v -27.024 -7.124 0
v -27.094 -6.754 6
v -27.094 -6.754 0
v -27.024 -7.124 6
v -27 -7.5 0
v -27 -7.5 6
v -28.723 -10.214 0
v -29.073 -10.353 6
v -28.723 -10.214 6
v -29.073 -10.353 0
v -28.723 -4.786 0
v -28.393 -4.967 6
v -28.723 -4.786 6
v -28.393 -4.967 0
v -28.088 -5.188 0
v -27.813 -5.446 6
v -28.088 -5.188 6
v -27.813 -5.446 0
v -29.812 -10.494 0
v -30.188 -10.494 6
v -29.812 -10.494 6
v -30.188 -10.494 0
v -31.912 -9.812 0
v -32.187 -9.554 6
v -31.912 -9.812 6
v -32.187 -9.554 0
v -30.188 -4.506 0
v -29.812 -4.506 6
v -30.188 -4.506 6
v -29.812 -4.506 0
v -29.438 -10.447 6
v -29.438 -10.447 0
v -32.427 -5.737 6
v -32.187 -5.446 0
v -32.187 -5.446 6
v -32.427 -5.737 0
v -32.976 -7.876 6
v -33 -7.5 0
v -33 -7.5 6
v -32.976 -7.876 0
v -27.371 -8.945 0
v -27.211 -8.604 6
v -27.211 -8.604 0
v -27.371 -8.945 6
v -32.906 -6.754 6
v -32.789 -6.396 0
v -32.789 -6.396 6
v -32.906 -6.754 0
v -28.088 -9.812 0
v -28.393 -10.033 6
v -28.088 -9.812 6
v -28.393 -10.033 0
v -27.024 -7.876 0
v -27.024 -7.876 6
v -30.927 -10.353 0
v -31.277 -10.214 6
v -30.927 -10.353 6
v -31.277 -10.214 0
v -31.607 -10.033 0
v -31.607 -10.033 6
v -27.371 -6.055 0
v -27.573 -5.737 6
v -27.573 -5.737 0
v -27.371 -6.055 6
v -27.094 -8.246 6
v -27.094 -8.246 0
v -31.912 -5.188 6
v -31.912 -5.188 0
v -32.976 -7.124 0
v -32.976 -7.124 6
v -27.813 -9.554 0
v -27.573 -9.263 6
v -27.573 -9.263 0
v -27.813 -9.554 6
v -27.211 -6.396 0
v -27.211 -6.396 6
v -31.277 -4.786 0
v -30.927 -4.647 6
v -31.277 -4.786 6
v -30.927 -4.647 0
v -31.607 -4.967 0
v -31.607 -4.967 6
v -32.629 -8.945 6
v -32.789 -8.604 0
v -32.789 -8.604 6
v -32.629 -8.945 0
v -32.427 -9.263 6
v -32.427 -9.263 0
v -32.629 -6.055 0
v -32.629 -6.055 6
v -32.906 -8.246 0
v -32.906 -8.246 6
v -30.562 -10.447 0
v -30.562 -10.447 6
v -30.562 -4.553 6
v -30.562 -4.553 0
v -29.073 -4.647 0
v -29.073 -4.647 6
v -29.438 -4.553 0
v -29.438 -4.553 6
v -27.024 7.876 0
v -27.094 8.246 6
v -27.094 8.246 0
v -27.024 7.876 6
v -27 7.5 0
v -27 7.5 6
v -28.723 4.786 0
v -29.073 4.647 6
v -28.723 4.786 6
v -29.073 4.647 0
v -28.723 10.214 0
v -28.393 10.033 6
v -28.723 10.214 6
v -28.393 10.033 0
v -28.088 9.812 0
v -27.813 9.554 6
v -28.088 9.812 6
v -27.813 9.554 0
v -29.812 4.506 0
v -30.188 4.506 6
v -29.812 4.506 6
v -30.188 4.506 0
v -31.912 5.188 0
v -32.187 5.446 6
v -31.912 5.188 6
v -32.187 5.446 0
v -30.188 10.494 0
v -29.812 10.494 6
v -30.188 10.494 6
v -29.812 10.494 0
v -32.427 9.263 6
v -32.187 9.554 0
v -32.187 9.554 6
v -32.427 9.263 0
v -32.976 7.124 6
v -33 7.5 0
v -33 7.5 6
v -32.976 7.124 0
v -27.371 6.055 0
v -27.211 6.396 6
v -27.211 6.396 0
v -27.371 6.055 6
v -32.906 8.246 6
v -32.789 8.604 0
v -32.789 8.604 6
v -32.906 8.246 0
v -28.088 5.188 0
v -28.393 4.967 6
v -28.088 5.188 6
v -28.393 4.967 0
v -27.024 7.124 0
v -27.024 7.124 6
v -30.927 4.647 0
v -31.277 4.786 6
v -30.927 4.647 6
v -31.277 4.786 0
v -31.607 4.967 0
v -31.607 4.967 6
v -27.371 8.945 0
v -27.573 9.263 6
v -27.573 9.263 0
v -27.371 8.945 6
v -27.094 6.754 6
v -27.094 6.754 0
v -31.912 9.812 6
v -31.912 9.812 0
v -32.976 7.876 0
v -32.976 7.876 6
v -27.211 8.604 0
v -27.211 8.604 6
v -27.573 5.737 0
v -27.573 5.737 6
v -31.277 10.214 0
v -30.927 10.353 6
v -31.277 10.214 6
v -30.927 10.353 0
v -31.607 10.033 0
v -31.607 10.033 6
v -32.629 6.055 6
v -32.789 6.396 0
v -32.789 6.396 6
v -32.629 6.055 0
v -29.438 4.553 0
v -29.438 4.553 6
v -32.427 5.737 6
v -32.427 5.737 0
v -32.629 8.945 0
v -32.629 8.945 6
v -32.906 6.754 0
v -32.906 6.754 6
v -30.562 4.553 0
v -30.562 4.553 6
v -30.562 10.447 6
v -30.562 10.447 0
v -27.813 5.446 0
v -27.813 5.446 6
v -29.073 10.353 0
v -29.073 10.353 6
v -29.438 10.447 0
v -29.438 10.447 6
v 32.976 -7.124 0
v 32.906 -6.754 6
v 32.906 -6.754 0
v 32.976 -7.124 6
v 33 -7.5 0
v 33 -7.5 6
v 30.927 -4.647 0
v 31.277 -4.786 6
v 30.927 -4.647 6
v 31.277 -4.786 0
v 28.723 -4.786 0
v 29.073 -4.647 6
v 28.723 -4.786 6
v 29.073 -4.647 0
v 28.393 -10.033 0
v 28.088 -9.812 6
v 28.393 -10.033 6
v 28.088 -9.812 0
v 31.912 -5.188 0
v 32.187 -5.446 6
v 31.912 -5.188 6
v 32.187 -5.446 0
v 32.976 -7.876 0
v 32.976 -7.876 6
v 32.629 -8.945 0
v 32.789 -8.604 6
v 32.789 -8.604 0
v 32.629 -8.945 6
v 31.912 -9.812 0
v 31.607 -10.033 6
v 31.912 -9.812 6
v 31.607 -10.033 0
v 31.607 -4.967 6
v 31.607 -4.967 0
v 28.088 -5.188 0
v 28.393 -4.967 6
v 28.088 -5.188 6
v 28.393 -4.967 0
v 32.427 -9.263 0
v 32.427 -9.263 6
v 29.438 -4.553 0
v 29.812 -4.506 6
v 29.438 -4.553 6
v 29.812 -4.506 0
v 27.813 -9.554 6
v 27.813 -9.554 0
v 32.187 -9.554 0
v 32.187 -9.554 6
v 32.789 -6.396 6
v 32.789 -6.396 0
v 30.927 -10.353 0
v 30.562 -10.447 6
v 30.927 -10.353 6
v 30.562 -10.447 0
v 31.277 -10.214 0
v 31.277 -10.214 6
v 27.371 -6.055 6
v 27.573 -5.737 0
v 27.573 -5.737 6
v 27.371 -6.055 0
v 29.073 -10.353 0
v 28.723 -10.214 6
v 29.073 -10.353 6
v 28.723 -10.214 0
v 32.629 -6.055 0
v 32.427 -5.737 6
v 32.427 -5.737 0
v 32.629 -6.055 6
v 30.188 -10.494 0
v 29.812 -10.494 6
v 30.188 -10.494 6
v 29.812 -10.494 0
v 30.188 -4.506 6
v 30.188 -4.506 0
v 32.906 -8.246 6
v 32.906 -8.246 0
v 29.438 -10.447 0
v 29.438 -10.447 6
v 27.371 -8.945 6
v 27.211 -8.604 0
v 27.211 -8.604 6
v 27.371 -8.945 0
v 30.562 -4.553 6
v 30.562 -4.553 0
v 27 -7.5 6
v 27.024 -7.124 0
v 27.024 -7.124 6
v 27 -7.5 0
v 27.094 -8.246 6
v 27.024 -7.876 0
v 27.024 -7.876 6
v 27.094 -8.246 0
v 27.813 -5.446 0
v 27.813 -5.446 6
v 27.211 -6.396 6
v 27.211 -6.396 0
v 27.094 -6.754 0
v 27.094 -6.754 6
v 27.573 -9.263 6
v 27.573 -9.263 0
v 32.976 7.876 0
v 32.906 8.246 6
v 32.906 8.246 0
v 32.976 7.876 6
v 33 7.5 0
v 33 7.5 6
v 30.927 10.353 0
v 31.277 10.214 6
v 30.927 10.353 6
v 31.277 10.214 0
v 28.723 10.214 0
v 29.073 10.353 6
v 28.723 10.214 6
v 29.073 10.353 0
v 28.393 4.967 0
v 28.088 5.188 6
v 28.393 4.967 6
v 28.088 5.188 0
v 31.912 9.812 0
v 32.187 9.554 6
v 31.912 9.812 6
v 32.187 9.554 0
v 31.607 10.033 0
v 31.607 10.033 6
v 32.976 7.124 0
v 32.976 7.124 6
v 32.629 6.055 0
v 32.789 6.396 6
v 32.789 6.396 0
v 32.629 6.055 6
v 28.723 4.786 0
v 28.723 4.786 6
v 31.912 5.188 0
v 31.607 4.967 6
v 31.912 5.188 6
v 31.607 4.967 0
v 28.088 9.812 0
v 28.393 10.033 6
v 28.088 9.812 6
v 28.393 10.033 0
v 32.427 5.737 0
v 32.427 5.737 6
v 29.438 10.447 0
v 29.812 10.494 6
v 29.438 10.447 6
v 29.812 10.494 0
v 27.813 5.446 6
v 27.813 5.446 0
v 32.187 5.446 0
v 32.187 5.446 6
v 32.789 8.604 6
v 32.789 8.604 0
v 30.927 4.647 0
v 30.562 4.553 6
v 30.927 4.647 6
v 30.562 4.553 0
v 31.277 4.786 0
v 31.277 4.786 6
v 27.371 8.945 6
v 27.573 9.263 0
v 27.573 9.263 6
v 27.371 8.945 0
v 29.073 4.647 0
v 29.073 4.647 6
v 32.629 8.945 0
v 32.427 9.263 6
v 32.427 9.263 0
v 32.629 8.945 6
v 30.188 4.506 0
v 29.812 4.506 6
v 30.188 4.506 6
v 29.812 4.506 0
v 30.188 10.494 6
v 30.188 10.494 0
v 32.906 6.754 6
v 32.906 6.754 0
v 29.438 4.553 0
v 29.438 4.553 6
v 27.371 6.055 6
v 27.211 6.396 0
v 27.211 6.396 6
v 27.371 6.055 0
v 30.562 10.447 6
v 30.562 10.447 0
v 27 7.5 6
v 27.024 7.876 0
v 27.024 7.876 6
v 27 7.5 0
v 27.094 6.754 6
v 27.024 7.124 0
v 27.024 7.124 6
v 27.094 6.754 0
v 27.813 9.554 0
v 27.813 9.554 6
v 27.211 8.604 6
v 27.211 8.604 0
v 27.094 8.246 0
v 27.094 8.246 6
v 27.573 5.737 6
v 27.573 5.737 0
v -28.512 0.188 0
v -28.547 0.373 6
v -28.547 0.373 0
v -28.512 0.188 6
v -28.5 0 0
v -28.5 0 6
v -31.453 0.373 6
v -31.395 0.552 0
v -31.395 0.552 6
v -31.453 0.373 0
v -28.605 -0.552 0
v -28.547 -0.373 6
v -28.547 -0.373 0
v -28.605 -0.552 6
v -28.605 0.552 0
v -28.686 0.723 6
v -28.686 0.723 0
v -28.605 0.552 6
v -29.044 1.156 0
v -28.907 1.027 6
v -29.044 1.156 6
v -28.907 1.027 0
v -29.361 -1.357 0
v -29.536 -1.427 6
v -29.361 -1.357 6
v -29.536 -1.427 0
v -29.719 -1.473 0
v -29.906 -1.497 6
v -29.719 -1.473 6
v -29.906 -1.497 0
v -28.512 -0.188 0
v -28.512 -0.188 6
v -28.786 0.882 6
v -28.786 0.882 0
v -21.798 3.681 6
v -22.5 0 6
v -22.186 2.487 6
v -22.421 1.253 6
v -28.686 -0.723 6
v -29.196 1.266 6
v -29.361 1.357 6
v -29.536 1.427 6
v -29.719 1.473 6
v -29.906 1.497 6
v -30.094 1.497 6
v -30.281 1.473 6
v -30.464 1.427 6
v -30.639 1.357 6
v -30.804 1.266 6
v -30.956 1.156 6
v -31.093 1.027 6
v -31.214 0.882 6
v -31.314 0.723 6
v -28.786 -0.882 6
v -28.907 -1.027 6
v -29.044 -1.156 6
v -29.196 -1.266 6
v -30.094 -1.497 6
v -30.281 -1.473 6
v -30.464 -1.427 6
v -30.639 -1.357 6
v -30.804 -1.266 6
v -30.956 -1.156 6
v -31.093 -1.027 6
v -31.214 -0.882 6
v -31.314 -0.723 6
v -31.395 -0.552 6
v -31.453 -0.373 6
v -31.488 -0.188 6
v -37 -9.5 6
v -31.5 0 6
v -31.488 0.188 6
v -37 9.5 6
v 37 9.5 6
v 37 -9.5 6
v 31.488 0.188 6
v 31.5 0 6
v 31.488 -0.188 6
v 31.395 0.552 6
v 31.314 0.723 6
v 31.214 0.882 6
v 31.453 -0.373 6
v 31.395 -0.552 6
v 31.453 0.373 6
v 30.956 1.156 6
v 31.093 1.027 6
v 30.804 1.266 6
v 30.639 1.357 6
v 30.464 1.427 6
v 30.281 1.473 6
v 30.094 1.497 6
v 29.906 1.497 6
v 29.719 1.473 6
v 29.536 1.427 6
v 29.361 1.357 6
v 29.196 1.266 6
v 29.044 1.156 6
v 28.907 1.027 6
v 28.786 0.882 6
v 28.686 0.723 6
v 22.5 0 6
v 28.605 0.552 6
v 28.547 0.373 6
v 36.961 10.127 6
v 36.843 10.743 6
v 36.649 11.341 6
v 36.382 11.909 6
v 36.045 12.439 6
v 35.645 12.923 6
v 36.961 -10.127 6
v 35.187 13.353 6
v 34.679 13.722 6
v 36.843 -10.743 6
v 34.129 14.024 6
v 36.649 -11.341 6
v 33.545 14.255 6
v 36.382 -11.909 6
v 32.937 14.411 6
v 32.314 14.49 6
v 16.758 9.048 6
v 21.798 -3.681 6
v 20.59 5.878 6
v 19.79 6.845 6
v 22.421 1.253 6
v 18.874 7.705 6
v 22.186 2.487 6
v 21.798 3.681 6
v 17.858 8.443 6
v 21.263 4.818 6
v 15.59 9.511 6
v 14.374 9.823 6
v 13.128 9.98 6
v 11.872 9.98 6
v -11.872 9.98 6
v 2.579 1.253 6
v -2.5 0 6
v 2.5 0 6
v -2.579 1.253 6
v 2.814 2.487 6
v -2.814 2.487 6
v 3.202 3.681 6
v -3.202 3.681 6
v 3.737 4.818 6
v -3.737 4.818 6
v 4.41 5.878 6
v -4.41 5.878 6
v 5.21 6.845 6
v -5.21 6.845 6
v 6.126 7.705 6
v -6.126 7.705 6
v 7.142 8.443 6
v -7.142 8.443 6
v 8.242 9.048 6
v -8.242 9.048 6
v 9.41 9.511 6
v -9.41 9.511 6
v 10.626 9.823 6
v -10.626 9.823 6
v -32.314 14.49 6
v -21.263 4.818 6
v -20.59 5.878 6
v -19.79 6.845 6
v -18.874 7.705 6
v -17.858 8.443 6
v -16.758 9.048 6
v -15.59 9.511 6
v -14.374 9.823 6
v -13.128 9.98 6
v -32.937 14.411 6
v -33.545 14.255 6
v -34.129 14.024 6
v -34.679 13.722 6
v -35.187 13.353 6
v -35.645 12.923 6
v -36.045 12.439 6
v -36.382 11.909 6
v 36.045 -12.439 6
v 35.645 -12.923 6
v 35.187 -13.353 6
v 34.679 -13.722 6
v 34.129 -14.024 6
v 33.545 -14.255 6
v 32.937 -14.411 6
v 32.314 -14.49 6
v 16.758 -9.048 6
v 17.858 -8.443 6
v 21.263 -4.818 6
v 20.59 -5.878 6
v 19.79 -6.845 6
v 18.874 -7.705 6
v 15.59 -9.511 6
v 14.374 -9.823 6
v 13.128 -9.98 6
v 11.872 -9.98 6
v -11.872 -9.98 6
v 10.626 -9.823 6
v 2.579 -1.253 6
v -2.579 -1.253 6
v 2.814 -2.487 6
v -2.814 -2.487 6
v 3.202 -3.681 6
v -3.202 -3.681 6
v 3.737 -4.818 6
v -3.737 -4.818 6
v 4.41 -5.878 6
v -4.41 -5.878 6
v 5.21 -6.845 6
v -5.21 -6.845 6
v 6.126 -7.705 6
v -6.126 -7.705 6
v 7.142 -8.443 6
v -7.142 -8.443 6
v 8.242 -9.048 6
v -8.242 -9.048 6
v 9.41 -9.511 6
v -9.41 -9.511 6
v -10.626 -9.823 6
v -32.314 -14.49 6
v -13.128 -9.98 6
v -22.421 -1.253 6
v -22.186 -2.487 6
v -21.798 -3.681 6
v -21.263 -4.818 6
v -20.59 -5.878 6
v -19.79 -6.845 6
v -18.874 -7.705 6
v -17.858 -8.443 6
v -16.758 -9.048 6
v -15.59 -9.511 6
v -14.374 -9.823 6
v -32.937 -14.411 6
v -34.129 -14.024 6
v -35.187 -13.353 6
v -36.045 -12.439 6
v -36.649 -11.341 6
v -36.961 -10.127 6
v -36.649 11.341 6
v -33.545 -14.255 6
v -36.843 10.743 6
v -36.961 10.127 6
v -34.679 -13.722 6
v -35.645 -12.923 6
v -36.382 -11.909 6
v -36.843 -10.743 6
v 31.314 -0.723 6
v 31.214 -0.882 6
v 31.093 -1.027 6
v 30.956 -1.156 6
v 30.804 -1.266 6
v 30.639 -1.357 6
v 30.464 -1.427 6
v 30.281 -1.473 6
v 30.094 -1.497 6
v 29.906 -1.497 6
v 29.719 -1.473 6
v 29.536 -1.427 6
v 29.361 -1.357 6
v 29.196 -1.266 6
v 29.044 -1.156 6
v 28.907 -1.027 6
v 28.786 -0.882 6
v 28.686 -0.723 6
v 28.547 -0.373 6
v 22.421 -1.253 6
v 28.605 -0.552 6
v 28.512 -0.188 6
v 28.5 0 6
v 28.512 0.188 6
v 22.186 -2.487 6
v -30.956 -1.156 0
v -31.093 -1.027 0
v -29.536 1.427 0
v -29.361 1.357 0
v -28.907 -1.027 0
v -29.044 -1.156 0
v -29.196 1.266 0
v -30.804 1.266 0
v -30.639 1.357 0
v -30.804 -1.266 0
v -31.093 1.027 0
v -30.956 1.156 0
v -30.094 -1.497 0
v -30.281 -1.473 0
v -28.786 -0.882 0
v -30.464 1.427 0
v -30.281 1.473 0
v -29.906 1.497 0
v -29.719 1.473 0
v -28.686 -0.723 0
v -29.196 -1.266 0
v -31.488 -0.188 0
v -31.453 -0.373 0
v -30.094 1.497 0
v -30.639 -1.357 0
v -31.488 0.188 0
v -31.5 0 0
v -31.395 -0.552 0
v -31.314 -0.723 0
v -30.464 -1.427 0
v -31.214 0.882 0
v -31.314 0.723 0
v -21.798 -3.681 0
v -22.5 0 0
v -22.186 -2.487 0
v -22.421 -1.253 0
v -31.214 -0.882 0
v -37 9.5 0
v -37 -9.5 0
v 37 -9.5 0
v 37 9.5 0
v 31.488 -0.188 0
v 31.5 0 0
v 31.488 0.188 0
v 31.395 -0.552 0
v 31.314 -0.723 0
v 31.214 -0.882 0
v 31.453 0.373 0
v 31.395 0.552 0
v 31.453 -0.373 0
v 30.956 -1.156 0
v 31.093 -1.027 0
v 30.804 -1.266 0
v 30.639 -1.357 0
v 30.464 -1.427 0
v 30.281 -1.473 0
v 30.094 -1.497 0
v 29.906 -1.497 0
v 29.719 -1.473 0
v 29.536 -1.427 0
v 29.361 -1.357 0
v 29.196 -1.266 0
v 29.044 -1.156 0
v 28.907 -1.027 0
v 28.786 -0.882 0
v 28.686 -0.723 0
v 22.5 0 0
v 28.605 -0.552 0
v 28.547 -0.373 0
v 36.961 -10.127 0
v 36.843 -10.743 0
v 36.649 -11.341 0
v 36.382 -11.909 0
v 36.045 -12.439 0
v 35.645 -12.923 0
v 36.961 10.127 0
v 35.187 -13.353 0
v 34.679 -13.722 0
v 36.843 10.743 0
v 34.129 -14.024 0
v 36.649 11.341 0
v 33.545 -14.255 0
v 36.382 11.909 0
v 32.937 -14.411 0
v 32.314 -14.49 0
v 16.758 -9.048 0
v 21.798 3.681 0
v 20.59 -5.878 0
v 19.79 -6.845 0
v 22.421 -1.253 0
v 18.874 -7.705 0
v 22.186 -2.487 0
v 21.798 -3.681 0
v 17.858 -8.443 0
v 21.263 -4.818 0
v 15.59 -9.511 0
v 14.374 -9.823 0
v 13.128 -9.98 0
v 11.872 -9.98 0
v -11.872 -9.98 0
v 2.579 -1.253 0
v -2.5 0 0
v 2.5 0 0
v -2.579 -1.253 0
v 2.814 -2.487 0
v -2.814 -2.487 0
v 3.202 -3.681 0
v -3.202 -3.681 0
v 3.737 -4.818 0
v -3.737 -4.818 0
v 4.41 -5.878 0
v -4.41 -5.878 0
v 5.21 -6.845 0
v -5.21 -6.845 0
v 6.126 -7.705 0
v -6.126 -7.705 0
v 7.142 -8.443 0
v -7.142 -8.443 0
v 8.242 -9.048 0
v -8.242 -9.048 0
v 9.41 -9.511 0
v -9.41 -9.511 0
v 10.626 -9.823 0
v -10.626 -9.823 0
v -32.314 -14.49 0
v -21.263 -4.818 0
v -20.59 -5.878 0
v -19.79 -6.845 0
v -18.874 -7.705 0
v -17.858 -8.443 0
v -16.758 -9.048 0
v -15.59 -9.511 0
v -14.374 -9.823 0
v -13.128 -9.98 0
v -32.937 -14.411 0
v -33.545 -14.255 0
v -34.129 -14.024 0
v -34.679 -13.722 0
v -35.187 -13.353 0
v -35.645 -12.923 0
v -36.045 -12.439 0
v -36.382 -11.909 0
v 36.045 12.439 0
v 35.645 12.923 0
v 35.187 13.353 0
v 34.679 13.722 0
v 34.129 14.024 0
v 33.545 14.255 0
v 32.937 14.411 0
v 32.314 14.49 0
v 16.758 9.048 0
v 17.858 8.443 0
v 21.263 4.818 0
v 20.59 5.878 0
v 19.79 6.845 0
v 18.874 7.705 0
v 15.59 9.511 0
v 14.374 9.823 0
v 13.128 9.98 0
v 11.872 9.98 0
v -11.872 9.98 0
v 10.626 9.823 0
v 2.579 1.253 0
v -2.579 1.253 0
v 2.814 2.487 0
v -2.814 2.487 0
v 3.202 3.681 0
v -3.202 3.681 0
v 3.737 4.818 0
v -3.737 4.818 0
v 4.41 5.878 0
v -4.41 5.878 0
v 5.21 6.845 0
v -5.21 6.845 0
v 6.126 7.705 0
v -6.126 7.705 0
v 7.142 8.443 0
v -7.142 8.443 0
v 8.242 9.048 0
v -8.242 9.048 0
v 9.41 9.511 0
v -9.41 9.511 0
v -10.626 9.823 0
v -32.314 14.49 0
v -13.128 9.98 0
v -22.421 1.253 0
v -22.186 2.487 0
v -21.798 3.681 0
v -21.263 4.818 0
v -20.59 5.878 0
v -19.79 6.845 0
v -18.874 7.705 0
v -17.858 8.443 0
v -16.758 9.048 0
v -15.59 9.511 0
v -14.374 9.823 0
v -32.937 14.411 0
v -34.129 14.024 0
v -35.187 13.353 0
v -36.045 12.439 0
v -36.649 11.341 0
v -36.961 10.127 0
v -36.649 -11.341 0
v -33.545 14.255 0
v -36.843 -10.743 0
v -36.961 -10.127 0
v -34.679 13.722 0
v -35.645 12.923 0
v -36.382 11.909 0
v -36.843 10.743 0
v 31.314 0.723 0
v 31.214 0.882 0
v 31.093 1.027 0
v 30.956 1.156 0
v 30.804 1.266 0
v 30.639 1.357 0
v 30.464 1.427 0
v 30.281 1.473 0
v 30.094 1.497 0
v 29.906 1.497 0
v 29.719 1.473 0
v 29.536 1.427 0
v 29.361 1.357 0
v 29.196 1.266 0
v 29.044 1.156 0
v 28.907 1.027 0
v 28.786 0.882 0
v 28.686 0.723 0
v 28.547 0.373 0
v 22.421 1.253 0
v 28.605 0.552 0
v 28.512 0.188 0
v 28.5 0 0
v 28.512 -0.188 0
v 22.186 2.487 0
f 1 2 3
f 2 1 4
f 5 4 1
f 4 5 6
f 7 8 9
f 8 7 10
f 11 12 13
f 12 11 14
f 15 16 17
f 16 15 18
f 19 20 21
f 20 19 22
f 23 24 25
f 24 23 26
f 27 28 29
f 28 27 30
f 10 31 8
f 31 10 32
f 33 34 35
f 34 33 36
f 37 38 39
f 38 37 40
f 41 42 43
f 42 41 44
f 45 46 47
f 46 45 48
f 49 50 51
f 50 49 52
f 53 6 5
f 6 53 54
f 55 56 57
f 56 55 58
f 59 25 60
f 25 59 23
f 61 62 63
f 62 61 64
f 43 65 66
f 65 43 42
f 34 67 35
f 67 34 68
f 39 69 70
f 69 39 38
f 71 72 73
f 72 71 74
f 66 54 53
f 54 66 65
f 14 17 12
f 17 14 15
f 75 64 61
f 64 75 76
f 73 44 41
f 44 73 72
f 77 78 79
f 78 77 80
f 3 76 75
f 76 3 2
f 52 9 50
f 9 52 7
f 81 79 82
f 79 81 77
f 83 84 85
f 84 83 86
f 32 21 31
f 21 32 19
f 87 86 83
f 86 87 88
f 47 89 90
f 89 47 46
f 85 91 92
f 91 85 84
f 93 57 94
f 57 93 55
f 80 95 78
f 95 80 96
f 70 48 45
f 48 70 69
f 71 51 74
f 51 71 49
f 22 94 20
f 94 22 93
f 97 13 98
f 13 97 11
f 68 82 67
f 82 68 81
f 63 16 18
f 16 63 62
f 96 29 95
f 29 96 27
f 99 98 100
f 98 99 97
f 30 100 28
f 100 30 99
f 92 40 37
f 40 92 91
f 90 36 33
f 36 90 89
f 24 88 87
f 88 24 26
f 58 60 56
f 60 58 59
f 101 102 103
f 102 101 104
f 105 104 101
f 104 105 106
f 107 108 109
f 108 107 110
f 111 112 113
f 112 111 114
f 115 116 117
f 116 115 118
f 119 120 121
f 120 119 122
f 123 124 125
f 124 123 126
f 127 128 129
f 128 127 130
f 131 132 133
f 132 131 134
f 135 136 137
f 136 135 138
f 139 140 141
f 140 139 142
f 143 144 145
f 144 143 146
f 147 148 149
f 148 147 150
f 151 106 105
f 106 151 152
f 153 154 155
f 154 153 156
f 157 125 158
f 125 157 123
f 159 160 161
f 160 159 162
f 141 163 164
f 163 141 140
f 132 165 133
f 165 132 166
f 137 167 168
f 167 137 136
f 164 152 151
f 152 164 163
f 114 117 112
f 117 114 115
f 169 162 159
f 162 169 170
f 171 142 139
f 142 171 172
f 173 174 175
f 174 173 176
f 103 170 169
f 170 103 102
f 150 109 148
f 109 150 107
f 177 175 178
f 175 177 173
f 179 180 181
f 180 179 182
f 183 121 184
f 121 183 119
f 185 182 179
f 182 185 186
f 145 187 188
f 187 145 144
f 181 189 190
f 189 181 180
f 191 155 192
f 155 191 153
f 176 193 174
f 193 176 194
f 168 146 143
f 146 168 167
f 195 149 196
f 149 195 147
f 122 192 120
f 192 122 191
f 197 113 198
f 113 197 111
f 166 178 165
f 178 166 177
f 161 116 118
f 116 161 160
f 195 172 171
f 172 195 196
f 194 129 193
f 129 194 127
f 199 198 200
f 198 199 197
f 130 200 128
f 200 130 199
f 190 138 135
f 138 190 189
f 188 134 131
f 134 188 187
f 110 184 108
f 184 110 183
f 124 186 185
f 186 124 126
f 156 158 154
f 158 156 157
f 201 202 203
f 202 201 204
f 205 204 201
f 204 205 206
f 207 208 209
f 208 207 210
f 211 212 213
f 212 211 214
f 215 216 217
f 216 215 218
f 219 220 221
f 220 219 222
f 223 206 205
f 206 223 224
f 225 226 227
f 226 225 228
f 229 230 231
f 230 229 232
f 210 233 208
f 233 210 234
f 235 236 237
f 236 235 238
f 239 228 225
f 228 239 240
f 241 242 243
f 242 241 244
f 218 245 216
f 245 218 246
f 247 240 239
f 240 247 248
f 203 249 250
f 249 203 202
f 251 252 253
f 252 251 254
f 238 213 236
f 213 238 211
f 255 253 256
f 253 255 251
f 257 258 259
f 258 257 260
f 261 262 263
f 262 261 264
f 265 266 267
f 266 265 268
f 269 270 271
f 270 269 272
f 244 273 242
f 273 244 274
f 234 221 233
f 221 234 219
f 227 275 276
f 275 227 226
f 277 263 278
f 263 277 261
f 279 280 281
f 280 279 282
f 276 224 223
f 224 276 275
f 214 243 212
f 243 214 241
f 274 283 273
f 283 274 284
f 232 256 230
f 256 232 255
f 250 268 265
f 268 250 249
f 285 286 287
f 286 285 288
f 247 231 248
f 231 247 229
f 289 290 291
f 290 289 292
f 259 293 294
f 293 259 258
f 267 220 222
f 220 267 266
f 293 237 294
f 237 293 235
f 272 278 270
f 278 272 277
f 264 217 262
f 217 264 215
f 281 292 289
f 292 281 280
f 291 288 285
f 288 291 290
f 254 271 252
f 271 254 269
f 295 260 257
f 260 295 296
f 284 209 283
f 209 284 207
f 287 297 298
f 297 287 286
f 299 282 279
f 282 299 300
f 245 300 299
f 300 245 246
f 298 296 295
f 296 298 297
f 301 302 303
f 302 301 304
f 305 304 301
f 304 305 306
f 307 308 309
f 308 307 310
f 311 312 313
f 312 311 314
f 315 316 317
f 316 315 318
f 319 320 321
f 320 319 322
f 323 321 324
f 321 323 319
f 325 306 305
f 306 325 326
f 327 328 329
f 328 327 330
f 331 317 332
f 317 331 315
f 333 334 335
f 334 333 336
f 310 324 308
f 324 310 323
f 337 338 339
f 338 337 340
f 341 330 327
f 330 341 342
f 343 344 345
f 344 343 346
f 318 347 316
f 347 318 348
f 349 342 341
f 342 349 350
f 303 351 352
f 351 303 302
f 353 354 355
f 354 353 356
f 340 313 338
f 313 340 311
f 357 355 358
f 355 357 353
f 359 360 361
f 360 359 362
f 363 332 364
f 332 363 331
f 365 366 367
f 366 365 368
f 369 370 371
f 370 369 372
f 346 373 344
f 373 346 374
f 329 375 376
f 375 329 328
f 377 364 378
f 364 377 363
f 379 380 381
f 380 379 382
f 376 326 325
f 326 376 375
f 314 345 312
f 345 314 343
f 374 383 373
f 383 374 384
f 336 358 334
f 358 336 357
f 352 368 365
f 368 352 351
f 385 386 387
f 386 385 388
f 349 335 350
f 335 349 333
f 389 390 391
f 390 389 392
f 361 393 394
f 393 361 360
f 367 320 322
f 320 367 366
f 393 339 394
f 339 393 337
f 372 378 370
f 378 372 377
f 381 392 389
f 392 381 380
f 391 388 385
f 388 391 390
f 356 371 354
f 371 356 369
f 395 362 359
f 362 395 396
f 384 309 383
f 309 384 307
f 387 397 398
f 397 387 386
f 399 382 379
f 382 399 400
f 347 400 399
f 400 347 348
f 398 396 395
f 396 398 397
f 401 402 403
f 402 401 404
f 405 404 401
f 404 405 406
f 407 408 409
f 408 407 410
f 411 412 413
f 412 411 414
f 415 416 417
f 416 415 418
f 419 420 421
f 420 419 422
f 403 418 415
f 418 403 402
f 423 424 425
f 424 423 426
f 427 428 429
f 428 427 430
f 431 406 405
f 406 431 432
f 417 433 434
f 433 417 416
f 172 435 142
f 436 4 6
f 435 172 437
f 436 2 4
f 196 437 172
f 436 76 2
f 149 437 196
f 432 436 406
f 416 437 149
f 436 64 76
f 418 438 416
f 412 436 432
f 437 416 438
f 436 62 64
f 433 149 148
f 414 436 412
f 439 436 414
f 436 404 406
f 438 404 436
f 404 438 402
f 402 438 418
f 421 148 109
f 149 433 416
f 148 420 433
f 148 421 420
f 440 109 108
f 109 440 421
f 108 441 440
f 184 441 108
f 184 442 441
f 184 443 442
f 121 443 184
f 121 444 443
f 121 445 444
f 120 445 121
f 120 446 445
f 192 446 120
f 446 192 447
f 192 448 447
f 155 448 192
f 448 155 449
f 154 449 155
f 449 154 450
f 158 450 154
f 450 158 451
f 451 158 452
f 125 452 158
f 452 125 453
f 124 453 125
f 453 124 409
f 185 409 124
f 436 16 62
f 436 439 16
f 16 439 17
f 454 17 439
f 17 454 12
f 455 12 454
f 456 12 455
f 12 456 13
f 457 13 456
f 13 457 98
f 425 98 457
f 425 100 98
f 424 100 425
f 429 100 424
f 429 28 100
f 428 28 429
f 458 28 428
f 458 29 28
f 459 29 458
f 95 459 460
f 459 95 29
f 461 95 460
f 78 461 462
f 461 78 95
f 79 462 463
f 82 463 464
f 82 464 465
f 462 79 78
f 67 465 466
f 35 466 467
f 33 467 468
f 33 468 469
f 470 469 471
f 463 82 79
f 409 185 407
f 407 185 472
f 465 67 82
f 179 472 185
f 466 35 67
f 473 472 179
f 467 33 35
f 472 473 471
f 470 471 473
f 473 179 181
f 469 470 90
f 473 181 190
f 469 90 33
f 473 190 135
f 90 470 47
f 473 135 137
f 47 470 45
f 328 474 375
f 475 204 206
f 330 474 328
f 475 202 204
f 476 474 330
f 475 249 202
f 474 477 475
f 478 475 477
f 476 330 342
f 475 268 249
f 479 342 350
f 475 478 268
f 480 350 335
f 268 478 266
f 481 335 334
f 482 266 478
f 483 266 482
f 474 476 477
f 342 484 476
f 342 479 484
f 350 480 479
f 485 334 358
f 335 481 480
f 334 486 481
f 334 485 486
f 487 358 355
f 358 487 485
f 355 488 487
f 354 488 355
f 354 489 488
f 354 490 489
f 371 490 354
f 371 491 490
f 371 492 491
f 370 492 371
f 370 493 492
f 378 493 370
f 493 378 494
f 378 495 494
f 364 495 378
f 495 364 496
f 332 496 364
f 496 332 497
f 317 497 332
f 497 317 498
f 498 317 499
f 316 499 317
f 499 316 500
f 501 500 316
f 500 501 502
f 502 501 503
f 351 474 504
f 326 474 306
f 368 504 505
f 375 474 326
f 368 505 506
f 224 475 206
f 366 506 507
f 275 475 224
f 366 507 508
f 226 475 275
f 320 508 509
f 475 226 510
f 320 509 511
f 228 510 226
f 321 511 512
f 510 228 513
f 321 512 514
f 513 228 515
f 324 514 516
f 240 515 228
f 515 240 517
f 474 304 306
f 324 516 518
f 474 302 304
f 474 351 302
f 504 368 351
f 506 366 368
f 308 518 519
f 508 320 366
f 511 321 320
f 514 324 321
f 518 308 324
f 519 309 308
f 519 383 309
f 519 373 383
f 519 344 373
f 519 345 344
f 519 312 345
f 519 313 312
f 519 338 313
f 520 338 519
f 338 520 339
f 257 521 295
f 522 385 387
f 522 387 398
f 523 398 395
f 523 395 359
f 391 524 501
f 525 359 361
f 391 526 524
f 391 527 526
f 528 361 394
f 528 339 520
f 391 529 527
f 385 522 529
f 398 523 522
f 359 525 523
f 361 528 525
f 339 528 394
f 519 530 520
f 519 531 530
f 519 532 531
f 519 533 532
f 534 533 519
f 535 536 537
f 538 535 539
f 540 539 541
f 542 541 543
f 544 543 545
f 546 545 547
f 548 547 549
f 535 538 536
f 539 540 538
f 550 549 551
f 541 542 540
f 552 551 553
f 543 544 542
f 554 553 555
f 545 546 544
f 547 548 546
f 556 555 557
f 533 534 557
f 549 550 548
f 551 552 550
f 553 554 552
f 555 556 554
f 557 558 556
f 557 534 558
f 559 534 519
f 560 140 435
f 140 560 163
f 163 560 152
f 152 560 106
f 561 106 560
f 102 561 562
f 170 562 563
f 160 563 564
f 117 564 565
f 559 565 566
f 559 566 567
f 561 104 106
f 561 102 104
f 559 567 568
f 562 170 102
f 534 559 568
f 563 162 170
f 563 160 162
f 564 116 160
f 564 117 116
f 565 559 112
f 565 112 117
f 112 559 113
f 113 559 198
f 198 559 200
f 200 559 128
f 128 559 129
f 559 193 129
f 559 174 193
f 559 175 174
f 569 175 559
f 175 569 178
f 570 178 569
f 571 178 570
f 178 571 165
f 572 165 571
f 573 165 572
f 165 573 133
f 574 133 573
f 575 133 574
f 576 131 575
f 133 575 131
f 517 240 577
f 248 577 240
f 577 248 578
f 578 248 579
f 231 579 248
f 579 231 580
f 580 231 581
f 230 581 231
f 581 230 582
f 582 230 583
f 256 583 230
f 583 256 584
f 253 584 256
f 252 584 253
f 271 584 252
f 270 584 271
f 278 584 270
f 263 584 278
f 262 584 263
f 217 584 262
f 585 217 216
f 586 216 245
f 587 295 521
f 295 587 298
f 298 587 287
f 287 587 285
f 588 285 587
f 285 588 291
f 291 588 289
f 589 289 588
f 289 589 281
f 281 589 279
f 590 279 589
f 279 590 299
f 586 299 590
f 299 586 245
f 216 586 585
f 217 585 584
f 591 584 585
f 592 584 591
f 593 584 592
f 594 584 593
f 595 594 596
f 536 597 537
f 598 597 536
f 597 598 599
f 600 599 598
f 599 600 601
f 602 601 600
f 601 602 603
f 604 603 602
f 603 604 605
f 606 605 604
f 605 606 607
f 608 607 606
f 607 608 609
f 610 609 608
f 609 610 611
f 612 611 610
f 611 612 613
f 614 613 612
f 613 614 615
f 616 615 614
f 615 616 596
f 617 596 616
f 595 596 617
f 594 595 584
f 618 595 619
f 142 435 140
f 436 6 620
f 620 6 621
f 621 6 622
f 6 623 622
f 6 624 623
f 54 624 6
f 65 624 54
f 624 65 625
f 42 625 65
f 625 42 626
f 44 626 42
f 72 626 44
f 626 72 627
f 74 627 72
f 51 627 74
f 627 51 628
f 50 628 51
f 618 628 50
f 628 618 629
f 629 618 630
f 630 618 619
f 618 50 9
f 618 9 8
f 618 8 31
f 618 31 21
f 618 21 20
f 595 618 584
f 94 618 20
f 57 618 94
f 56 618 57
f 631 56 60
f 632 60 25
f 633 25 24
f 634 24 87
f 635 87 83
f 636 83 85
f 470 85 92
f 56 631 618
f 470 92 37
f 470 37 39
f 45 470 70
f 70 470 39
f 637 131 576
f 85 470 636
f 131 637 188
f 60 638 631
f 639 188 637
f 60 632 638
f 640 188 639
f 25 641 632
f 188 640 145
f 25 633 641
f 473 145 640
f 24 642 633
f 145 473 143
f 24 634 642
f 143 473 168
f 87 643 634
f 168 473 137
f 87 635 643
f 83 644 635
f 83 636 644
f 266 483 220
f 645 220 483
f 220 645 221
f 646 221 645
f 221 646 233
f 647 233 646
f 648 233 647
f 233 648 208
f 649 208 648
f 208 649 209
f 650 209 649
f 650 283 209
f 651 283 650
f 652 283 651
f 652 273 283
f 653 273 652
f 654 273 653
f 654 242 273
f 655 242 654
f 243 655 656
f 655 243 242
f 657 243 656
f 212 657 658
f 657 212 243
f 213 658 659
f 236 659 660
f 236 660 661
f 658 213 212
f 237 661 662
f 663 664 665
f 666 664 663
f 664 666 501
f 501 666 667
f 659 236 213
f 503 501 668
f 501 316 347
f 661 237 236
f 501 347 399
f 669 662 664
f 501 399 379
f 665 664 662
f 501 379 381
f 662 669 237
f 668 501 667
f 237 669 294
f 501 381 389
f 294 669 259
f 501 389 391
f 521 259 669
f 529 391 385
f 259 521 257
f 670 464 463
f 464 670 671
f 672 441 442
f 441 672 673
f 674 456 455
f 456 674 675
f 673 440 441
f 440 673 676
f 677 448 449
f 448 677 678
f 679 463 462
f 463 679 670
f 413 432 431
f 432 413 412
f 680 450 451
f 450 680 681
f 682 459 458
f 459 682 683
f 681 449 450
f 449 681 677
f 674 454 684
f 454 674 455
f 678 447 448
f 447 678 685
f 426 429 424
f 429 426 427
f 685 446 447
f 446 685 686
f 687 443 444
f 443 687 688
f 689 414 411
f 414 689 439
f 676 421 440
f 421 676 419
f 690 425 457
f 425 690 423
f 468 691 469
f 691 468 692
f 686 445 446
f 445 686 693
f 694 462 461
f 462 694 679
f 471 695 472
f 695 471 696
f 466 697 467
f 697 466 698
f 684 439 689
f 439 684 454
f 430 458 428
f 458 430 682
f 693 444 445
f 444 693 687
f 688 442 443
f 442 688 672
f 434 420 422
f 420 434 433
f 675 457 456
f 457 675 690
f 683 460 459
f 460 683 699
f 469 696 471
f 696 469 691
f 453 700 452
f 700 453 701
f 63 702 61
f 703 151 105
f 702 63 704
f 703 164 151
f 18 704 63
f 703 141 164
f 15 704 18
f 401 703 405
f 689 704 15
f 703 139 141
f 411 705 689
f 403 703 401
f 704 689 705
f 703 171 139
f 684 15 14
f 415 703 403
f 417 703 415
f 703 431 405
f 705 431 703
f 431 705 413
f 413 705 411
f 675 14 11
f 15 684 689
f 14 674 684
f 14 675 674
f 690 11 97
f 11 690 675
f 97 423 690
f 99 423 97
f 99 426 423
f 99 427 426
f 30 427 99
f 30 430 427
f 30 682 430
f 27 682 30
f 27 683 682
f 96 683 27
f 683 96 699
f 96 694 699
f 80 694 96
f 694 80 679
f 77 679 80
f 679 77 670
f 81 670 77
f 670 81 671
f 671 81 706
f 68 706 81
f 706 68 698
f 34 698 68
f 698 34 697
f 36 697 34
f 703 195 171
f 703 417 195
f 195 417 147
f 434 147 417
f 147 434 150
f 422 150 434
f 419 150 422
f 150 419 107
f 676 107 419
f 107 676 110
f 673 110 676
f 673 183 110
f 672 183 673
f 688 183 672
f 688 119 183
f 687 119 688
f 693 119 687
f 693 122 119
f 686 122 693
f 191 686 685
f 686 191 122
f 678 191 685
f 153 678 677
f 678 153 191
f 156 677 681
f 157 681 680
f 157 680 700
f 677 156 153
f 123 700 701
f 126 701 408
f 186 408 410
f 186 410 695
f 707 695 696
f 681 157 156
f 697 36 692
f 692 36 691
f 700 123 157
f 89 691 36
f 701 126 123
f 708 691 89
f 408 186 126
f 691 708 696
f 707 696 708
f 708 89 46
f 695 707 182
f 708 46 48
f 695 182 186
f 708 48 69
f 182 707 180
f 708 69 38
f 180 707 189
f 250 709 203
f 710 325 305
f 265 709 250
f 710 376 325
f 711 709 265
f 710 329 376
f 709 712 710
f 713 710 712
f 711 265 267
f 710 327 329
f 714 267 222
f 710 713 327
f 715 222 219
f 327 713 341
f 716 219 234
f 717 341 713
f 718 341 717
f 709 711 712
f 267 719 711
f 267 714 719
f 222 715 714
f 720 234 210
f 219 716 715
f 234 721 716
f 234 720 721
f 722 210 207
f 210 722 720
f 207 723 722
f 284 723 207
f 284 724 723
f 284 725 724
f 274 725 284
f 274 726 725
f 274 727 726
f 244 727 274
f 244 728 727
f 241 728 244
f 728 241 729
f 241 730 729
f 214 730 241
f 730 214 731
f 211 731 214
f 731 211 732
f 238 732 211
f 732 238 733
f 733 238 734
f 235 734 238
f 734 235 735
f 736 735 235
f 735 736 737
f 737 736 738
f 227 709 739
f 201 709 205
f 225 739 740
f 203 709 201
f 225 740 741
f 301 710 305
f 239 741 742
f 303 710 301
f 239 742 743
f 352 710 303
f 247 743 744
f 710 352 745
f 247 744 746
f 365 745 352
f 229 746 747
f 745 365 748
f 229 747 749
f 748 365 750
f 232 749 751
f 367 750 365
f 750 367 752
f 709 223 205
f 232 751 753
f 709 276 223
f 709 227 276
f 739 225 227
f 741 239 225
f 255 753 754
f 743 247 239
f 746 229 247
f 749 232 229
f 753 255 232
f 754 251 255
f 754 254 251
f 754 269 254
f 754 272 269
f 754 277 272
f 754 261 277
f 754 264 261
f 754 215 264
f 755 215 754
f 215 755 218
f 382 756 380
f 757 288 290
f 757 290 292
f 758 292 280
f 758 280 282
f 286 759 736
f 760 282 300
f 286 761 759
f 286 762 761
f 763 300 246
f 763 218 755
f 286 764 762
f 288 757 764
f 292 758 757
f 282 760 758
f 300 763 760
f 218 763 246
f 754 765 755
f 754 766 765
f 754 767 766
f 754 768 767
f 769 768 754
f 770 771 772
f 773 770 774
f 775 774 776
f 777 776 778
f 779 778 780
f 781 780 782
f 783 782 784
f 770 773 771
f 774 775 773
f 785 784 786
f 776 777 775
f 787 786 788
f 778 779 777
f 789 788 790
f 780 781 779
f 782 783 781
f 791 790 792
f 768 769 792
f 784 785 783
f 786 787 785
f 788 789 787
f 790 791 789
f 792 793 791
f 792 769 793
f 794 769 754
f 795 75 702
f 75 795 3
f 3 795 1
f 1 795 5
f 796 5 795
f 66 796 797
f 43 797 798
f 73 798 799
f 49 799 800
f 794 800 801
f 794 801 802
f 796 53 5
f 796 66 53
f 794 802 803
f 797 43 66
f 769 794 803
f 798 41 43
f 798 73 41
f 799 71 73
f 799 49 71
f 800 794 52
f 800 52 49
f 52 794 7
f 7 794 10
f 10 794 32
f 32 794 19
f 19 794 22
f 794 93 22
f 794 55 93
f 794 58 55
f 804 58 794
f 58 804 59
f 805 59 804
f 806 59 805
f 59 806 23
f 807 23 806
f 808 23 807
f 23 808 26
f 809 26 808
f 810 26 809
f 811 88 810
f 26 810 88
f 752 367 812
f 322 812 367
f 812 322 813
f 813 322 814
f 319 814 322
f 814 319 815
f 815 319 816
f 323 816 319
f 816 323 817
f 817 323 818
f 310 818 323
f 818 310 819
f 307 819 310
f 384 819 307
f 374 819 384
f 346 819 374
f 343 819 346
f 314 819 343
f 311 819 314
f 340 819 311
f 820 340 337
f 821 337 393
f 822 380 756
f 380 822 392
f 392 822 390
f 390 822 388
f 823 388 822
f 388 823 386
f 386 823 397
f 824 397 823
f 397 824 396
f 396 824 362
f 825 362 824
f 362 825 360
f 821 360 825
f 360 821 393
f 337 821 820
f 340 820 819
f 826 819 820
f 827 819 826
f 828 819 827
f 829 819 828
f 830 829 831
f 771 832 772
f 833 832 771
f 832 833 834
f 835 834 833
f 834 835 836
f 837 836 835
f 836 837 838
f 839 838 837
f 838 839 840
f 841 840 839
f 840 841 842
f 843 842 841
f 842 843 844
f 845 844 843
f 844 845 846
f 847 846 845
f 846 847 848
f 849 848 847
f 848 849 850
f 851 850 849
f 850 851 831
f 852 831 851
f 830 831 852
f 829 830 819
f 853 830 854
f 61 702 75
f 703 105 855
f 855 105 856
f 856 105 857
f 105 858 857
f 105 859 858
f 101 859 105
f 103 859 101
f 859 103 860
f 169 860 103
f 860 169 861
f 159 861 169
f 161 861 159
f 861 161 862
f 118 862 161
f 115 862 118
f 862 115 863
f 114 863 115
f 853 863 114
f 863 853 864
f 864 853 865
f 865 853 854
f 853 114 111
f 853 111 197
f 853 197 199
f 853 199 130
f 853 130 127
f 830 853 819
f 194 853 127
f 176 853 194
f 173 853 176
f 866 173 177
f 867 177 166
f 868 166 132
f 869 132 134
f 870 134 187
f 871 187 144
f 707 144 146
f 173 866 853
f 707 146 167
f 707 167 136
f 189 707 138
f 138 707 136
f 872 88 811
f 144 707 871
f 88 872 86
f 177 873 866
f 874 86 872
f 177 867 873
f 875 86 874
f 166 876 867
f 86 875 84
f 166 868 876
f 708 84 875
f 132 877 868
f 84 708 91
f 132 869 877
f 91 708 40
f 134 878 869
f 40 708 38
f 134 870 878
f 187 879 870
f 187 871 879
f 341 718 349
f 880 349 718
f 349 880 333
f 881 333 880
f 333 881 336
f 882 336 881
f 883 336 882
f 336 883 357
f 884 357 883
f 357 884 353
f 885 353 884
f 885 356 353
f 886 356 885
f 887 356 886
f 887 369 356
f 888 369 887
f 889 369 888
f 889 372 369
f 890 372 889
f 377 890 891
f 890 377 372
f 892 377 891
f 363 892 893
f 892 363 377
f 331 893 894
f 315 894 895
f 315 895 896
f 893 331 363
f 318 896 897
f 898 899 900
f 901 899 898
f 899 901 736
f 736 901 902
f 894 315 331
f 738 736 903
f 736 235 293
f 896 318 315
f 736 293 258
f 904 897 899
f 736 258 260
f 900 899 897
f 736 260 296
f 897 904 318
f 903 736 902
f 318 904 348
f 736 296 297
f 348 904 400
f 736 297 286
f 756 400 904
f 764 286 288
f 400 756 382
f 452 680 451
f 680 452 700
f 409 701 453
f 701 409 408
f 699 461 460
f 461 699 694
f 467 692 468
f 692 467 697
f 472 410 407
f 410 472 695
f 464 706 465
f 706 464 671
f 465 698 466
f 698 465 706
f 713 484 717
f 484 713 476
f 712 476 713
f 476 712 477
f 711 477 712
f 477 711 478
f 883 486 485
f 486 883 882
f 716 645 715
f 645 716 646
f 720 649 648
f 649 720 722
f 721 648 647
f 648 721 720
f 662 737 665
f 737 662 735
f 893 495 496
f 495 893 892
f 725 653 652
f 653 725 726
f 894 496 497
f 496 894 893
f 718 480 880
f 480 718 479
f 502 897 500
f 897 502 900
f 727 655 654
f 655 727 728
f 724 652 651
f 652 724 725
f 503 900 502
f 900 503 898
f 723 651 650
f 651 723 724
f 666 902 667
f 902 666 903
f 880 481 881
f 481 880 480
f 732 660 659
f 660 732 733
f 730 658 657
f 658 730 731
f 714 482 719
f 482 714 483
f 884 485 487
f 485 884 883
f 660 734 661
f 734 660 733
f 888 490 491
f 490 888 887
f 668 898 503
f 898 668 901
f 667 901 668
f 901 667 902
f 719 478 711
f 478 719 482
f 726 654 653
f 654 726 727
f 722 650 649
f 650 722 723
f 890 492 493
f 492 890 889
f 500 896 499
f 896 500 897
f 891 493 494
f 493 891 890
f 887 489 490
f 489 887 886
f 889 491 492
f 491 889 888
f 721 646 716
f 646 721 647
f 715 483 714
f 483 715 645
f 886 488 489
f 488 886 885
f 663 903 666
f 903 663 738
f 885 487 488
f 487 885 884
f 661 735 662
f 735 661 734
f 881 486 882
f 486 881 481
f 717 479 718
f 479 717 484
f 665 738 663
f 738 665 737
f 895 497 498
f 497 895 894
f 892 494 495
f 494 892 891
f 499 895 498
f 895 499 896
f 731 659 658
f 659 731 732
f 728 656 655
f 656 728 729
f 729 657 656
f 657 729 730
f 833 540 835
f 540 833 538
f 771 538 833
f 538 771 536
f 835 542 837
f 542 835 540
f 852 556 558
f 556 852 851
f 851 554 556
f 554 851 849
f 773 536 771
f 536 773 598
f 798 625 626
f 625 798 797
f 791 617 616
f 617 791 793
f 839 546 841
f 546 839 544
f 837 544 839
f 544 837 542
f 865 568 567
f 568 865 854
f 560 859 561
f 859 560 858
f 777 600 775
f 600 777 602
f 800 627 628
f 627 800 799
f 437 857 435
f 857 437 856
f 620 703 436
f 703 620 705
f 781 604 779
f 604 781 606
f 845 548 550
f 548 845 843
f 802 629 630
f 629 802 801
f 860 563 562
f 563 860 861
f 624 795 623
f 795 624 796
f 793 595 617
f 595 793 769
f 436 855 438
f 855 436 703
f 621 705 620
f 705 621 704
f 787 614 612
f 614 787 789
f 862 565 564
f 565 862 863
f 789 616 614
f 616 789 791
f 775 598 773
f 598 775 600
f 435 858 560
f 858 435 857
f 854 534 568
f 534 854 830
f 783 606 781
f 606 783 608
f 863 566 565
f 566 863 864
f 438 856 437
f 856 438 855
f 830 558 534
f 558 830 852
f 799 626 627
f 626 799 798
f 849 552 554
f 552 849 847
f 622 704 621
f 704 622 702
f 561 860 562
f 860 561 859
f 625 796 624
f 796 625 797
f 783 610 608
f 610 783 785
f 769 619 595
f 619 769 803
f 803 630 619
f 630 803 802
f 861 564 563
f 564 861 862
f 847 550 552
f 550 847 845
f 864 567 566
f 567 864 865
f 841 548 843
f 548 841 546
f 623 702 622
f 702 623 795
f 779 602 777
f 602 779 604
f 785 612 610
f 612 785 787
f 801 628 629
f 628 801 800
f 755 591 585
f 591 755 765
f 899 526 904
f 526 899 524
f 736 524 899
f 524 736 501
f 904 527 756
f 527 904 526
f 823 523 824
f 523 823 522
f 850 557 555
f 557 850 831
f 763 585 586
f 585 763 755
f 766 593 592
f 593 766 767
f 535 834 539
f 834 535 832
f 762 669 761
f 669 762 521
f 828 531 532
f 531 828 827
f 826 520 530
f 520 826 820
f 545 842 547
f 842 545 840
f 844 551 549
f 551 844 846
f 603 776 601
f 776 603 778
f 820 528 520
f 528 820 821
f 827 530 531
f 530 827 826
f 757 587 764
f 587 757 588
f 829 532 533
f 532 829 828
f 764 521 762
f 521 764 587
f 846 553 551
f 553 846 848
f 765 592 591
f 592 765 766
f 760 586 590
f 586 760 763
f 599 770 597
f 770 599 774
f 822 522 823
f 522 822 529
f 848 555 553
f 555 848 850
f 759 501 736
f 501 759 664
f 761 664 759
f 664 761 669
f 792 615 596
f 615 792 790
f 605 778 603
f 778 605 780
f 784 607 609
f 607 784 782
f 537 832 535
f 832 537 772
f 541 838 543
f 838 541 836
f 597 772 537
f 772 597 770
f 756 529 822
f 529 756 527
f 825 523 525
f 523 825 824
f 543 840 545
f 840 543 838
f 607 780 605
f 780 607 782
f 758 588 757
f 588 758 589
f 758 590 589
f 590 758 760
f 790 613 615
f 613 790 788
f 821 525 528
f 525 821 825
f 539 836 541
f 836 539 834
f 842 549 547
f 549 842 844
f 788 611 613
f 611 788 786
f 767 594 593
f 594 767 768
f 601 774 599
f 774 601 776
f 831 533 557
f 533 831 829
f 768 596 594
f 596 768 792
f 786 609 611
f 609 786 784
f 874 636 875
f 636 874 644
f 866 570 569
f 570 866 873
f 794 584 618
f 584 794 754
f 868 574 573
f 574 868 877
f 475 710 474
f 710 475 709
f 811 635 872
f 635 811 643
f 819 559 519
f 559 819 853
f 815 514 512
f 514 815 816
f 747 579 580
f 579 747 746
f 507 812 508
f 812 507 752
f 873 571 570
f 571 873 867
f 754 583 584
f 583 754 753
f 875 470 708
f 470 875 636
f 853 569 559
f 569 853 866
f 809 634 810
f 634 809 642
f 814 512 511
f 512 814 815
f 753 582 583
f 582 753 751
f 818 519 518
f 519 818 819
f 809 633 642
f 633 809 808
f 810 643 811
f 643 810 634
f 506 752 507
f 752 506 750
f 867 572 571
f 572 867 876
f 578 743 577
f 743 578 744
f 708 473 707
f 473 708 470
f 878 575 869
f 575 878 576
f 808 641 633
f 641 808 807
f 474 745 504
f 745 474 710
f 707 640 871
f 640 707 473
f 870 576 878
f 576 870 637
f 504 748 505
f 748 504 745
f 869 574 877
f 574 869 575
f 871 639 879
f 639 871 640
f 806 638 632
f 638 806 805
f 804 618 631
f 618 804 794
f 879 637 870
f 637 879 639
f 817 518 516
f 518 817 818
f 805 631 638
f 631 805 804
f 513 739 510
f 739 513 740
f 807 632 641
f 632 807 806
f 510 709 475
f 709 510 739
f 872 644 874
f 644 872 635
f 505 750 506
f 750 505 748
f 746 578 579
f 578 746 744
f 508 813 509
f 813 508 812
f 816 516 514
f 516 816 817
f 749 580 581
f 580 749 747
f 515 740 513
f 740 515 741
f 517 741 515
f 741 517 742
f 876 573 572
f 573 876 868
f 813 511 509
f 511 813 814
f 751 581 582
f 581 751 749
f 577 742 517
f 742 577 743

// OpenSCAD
$fn = 50;


difference() {
	union() {
		hull() {
			translate(v = [-32.0000000000, 9.5000000000, 0]) {
				cylinder(h = 6, r = 5);
			}
			translate(v = [32.0000000000, 9.5000000000, 0]) {
				cylinder(h = 6, r = 5);
			}
			translate(v = [-32.0000000000, -9.5000000000, 0]) {
				cylinder(h = 6, r = 5);
			}
			translate(v = [32.0000000000, -9.5000000000, 0]) {
				cylinder(h = 6, r = 5);
			}
		}
	}
	union() {
		#translate(v = [-30.0000000000, -7.5000000000, 0]) {
			cylinder(h = 6, r = 3.0000000000);
		}
		#translate(v = [-30.0000000000, 7.5000000000, 0]) {
			cylinder(h = 6, r = 3.0000000000);
		}
		#translate(v = [30.0000000000, -7.5000000000, 0]) {
			cylinder(h = 6, r = 3.0000000000);
		}
		#translate(v = [30.0000000000, 7.5000000000, 0]) {
			cylinder(h = 6, r = 3.0000000000);
		}
		#translate(v = [-30.0000000000, -7.5000000000, -100.0000000000]) {
			cylinder(h = 200, r = 3.0000000000);
		}
		#translate(v = [-30.0000000000, 7.5000000000, -100.0000000000]) {
			cylinder(h = 200, r = 3.0000000000);
		}
		#translate(v = [30.0000000000, -7.5000000000, -100.0000000000]) {
			cylinder(h = 200, r = 3.0000000000);
		}
		#translate(v = [30.0000000000, 7.5000000000, -100.0000000000]) {
			cylinder(h = 200, r = 3.0000000000);
		}
		#translate(v = [-30.0000000000, -7.5000000000, 0]) {
			cylinder(h = 6, r = 1.5000000000);
		}
		#translate(v = [-30.0000000000, 0.0000000000, 0]) {
			cylinder(h = 6, r = 1.5000000000);
		}
		#translate(v = [-30.0000000000, 7.5000000000, 0]) {
			cylinder(h = 6, r = 1.5000000000);
		}
		#translate(v = [30.0000000000, -7.5000000000, 0]) {
			cylinder(h = 6, r = 1.5000000000);
		}
		#translate(v = [30.0000000000, 0.0000000000, 0]) {
			cylinder(h = 6, r = 1.5000000000);
		}
		#translate(v = [30.0000000000, 7.5000000000, 0]) {
			cylinder(h = 6, r = 1.5000000000);
		}
		#translate(v = [-30.0000000000, -7.5000000000, 0]) {
			cylinder(h = 6, r = 1.5000000000);
		}
		#translate(v = [-30.0000000000, 0.0000000000, 0]) {
			cylinder(h = 6, r = 1.5000000000);
		}
		#translate(v = [-30.0000000000, 7.5000000000, 0]) {
			cylinder(h = 6, r = 1.5000000000);
		}
		#translate(v = [30.0000000000, -7.5000000000, 0]) {
			cylinder(h = 6, r = 1.5000000000);
		}
		#translate(v = [30.0000000000, 0.0000000000, 0]) {
			cylinder(h = 6, r = 1.5000000000);
		}
		#translate(v = [30.0000000000, 7.5000000000, 0]) {
			cylinder(h = 6, r = 1.5000000000);
		}
		#translate(v = [-30.0000000000, -7.5000000000, 0]) {
			cylinder(h = 6, r = 1.5000000000);
		}
		#translate(v = [-30.0000000000, 0.0000000000, 0]) {
			cylinder(h = 6, r = 1.5000000000);
		}
		#translate(v = [-30.0000000000, 7.5000000000, 0]) {
			cylinder(h = 6, r = 1.5000000000);
		}
		#translate(v = [30.0000000000, -7.5000000000, 0]) {
			cylinder(h = 6, r = 1.5000000000);
		}
		#translate(v = [30.0000000000, 0.0000000000, 0]) {
			cylinder(h = 6, r = 1.5000000000);
		}
		#translate(v = [30.0000000000, 7.5000000000, 0]) {
			cylinder(h = 6, r = 1.5000000000);
		}
		#translate(v = [-12.5000000000, 0, 0]) {
			cylinder(h = 6, r = 10.0000000000);
		}
		#translate(v = [12.5000000000, 0, 0]) {
			cylinder(h = 6, r = 10.0000000000);
		}
	}
}
